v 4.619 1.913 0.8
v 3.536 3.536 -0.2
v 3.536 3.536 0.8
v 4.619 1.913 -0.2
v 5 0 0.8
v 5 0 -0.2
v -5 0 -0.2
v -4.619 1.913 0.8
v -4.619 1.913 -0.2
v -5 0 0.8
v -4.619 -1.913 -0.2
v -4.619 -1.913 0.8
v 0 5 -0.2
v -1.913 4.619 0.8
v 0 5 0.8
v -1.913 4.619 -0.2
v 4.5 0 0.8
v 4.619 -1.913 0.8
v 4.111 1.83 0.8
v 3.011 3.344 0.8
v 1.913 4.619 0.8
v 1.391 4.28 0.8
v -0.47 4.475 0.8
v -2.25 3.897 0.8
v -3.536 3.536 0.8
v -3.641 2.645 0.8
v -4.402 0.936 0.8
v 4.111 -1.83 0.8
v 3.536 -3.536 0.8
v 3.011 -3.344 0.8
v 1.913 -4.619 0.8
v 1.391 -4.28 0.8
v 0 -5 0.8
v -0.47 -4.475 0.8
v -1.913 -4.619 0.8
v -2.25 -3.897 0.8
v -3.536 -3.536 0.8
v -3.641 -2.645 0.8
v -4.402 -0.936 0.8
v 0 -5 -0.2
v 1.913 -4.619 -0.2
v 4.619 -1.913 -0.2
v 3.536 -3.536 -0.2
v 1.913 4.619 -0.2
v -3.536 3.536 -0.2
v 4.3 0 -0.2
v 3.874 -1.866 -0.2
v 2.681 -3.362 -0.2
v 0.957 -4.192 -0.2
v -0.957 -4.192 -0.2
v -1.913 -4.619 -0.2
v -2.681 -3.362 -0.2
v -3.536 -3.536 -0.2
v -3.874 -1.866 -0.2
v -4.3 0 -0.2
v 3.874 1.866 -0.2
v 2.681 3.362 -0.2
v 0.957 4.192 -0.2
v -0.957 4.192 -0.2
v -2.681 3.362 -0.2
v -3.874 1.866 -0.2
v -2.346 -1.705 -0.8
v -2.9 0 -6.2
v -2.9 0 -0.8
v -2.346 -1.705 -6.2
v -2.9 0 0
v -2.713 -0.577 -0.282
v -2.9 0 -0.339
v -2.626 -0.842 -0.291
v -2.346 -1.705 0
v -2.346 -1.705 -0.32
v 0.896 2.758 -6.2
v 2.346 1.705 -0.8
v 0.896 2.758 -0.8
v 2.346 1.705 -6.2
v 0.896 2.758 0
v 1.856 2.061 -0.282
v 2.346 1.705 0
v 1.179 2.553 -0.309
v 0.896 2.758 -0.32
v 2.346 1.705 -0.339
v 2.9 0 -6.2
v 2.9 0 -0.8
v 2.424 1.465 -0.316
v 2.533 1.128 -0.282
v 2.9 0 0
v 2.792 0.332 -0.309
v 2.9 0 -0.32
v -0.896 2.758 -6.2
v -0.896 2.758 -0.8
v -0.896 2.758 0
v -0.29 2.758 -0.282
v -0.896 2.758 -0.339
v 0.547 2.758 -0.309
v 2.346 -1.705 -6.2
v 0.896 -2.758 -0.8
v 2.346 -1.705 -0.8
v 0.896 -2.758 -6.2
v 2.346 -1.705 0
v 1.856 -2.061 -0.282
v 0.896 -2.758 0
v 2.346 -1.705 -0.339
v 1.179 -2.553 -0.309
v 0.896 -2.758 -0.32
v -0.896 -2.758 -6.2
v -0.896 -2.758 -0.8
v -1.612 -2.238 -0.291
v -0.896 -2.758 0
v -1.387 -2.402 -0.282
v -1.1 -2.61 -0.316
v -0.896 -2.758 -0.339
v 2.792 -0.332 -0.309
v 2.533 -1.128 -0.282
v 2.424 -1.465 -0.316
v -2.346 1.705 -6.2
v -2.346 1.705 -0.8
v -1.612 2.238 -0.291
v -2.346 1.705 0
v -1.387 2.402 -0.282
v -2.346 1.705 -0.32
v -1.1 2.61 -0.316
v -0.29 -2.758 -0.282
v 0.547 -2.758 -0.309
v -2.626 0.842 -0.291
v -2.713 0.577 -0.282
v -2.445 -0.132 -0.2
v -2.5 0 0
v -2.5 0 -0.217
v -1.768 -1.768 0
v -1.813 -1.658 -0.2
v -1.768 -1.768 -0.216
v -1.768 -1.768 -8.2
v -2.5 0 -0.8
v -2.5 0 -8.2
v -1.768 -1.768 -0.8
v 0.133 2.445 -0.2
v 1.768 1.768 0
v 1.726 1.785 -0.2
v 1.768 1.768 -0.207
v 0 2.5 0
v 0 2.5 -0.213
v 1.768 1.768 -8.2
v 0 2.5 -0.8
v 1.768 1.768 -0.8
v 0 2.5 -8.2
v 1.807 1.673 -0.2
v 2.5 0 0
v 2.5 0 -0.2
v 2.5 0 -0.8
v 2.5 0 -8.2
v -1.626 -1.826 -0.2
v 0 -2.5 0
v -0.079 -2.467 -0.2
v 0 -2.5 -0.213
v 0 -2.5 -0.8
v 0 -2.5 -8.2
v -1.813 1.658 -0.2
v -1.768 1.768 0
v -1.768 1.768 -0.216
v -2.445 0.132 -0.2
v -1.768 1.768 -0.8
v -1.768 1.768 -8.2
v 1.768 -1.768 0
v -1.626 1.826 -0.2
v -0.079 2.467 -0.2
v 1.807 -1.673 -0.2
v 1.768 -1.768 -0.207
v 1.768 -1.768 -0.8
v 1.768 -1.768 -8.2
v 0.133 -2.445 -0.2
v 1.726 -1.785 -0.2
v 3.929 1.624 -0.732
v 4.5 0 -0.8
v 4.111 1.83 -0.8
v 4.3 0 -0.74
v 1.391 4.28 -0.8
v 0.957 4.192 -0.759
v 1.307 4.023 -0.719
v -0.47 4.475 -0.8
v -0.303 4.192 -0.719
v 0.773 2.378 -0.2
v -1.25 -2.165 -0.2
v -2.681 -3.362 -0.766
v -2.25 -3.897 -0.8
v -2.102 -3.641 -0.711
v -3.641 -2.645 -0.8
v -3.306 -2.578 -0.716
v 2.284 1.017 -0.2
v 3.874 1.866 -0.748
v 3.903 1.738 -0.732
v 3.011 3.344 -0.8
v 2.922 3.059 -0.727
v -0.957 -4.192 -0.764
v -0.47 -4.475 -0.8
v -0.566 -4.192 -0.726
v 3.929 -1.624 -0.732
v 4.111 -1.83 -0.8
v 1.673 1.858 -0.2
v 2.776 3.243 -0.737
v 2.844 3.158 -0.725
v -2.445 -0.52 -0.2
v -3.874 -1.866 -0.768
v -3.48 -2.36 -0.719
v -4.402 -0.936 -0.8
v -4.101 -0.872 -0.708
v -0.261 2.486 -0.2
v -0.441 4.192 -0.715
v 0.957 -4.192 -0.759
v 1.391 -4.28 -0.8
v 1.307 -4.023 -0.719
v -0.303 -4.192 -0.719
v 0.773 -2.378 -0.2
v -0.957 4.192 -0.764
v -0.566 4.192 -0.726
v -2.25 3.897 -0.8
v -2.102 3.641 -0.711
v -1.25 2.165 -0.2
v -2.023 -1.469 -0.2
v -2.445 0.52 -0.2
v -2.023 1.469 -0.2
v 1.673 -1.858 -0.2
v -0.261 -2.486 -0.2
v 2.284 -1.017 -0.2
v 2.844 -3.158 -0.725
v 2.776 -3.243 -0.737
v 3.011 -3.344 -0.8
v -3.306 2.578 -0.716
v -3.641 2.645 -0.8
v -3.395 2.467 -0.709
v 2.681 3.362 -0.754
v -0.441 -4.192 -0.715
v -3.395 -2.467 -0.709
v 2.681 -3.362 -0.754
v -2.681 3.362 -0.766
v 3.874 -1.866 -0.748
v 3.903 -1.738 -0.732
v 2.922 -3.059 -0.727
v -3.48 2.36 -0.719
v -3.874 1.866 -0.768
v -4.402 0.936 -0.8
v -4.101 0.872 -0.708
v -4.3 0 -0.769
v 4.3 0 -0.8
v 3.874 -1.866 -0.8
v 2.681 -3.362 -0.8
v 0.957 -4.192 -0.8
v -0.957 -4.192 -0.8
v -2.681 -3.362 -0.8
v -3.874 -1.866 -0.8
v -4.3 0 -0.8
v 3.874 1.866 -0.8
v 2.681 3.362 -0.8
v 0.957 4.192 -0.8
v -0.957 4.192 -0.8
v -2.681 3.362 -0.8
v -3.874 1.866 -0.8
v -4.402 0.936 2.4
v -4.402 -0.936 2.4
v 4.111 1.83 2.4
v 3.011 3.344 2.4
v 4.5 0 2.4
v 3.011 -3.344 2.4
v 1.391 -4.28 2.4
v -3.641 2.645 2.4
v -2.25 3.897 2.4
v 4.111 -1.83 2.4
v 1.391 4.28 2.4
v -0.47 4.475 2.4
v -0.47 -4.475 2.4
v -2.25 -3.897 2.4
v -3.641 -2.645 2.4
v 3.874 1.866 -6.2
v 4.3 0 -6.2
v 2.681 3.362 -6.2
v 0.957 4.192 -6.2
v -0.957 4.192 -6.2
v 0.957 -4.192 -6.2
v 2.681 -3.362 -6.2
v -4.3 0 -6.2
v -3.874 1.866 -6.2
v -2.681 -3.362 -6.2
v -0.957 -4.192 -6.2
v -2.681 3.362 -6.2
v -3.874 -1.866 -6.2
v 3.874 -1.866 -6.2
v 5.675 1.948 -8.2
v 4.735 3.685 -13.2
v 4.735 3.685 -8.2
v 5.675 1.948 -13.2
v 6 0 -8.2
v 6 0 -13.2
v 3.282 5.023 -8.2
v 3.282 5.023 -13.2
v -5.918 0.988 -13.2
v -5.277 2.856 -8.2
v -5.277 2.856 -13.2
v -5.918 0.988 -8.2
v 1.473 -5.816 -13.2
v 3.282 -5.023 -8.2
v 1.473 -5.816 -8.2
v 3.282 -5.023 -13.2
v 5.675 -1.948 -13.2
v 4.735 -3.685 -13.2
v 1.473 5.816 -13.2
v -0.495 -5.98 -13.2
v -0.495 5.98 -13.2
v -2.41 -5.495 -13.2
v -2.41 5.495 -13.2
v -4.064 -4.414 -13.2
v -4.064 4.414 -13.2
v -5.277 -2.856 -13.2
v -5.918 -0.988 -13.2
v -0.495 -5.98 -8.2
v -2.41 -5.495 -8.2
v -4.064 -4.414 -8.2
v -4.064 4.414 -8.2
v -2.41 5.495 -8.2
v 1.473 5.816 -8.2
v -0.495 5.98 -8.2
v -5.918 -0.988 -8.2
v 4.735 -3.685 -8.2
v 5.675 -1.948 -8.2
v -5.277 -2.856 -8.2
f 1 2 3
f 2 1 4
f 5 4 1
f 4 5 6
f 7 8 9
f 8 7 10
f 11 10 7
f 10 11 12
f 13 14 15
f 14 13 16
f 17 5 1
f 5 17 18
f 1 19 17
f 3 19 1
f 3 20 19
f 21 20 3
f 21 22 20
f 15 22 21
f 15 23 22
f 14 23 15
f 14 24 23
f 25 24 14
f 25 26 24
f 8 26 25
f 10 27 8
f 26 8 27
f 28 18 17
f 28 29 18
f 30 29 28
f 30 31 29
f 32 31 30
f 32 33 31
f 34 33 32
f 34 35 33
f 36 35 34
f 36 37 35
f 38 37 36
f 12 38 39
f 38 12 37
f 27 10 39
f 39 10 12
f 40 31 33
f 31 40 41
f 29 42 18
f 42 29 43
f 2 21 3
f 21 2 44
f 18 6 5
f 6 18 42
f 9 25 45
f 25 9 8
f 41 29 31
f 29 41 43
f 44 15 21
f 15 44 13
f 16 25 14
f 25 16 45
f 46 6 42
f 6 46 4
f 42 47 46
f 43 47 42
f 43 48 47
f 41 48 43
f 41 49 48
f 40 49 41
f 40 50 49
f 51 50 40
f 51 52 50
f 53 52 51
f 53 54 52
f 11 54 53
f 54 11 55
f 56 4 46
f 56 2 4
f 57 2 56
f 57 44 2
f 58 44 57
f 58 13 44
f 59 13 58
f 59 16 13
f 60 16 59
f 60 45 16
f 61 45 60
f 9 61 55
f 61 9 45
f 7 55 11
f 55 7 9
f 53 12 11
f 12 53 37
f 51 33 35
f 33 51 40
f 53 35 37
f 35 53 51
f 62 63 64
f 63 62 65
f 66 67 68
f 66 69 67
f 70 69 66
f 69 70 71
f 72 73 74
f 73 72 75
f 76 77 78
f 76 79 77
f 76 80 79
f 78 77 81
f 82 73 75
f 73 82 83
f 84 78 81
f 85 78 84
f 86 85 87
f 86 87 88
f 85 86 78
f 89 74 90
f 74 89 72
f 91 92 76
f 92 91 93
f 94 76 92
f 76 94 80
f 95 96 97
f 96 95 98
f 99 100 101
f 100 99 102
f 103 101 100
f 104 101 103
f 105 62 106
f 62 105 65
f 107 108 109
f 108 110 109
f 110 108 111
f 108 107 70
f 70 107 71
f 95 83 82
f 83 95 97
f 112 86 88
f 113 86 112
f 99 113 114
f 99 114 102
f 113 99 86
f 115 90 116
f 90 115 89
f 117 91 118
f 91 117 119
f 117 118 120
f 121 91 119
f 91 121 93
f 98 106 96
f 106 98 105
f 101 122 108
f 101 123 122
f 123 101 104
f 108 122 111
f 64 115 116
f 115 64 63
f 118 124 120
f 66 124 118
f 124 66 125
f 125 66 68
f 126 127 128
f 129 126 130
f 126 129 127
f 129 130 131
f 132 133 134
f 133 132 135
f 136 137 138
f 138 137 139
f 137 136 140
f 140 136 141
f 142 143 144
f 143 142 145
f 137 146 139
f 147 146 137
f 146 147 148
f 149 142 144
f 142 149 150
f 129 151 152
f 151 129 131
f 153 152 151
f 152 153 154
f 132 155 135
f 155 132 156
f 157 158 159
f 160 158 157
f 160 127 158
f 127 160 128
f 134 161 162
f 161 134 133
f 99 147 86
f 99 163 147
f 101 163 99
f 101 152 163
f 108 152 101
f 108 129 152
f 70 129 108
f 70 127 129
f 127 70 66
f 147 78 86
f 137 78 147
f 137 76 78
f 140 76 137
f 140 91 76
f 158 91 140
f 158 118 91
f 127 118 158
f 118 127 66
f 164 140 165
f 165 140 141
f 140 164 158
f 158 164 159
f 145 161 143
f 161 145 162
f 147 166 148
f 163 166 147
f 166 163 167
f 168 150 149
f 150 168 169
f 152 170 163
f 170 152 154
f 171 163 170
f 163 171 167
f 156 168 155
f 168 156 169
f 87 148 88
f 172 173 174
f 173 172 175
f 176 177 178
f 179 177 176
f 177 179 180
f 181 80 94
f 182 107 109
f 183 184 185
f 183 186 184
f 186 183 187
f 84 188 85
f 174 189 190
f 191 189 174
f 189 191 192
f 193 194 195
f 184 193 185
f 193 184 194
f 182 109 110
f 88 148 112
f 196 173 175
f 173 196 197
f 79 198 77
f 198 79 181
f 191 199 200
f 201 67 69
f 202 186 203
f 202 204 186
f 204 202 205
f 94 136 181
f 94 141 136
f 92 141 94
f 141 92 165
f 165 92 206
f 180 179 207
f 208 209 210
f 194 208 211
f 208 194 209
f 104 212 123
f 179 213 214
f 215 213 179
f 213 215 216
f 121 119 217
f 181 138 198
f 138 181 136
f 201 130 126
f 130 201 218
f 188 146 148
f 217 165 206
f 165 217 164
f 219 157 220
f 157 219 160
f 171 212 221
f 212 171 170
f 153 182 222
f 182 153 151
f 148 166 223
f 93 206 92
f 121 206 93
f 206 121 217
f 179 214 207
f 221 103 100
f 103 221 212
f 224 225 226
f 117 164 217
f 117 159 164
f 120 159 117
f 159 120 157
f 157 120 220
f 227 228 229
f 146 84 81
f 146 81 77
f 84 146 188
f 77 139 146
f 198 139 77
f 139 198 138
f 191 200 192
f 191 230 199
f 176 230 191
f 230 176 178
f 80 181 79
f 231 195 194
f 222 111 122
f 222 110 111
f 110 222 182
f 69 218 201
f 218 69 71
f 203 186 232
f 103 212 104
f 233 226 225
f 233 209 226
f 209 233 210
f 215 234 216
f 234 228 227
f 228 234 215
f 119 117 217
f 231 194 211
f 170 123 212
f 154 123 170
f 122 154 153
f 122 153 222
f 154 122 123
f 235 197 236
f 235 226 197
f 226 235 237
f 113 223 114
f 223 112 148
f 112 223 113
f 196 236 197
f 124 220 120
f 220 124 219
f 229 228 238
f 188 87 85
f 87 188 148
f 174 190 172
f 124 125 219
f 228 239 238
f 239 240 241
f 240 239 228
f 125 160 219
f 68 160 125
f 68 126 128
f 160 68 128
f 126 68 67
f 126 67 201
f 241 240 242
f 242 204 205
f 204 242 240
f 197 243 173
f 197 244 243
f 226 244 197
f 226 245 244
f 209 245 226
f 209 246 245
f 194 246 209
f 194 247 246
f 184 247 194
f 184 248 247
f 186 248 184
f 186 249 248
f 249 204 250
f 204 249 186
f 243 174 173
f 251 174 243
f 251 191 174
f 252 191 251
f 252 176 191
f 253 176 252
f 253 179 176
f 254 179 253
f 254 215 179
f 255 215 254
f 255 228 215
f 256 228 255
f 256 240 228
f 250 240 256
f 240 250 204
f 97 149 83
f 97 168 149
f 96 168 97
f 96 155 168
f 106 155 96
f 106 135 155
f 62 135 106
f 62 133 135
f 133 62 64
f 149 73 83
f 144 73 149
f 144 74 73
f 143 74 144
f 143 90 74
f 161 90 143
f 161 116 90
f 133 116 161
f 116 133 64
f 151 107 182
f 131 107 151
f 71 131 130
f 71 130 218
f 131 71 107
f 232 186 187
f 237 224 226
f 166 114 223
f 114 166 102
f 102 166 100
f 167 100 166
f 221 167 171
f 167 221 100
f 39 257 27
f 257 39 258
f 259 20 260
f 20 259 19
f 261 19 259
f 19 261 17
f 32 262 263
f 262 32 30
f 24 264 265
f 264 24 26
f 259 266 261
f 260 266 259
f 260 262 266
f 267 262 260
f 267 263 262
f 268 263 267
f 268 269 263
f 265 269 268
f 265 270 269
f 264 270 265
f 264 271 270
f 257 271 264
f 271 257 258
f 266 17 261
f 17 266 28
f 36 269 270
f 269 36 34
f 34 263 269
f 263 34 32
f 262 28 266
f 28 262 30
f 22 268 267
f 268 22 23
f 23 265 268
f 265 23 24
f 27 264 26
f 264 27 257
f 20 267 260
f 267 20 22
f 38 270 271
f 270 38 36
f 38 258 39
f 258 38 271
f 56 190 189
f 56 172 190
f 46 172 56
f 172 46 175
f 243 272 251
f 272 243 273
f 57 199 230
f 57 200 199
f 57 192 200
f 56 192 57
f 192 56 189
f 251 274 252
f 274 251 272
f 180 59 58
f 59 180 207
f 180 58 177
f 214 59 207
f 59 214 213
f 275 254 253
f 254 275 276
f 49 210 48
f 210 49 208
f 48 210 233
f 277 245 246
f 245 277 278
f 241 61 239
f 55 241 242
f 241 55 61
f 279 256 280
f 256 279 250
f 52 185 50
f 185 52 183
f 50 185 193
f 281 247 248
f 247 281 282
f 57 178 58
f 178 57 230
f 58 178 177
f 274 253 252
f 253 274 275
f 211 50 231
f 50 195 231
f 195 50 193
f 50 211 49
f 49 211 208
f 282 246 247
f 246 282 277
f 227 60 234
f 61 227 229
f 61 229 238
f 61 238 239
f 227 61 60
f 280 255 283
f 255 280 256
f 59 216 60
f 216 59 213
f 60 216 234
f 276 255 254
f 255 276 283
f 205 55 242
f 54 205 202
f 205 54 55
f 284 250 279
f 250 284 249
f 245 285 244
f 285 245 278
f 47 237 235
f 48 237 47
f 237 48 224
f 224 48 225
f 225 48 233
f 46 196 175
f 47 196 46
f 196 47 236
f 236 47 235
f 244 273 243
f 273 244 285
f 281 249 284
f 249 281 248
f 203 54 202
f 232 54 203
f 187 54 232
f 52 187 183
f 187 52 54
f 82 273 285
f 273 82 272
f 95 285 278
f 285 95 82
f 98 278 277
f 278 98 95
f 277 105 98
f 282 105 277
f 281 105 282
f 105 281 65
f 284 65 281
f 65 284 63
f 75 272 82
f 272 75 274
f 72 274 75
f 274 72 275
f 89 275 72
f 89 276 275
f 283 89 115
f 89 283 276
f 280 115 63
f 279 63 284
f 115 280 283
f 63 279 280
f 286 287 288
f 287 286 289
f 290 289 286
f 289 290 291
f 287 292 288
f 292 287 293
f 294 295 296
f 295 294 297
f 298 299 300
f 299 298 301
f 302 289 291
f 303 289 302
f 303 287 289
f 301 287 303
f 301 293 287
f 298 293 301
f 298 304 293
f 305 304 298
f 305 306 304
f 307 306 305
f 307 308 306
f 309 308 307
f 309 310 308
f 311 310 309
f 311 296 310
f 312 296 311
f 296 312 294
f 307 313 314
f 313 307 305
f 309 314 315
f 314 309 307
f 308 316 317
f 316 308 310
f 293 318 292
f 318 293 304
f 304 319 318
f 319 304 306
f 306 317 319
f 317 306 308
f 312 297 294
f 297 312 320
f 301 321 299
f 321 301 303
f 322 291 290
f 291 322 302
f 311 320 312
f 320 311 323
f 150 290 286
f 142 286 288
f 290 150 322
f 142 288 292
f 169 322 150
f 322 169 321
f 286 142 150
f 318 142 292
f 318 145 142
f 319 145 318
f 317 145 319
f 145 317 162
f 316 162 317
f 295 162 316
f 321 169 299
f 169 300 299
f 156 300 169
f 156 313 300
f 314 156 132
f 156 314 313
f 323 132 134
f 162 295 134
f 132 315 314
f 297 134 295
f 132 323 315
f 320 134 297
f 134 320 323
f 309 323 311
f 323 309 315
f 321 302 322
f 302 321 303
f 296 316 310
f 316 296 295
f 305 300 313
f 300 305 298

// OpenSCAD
// Parameters
shaft_diameter_mm = 5; //[2.5:10:0.1]
length_mm = 10; //[5:20:0.1]
head_diameter_mm = 9; //[4.5:18:0.1]
head_height_mm = 2.4; //[1.2:4.8:0.1]
tip_length_mm = 1.2; //[0.6:2.4:0.1]
transition_height_mm = 0.6; //[0.3:1.2:0.1]
overlap_mm = 0.8; //[0.5:2:0.1]
washer_outer_diameter_mm = 10; //[6:20:0.1]
washer_thickness_mm = 1; //[0.5:2:0.1]
pcb_spacer_height_mm = 6; //[3:12:0.1]
pcb_spacer_wall_mm = 1.8; //[0.9:3.6:0.1]
buzzer_diameter_mm = 12; //[6:24:0.1]
buzzer_height_mm = 5; //[2.5:10:0.1]
buzzer_post_diameter_mm = 3; //[1.5:6:0.1]
buzzer_post_height_mm = 2; //[1:4:0.1]

// Screw and Washer - complete geometry
module screw_and_washer() {
  color("DimGray") {
    // Screw Shaft
    translate([0, 0, -length_mm/2])
      cylinder(h=length_mm, r=shaft_diameter_mm/2, center=true);
    // Shaft Tip
    translate([0, 0, -length_mm - tip_length_mm/2 + overlap_mm])
      cylinder(h=tip_length_mm, r1=shaft_diameter_mm/2, r2=0, center=true);
    // Head to Shaft Transition
    translate([0, 0, transition_height_mm/2 - overlap_mm])
      cylinder(h=transition_height_mm, r1=head_diameter_mm/2, r2=shaft_diameter_mm/2, center=true);
    // Screw Head
    translate([0, 0, head_height_mm/2])
      cylinder(h=head_height_mm, r=head_diameter_mm/2, center=true);
    // Washer
    difference() {
      translate([0, 0, -washer_thickness_mm/2 + overlap_mm])
        cylinder(h=washer_thickness_mm, r=washer_outer_diameter_mm/2, center=true);
      translate([0, 0, -washer_thickness_mm/2 + overlap_mm])
        cylinder(h=washer_thickness_mm + 2*overlap_mm, r=shaft_diameter_mm/2 + overlap_mm/2, center=true);
    }
  }
}

// PCB Spacer - complete geometry
module pcb_spacer() {
  color("Silver") {
    difference() {
      translate([0, 0, -washer_thickness_mm - pcb_spacer_height_mm/2 + overlap_mm])
        cylinder(h=pcb_spacer_height_mm, r=shaft_diameter_mm/2 + pcb_spacer_wall_mm, center=true);
      translate([0, 0, -washer_thickness_mm - pcb_spacer_height_mm/2 + overlap_mm])
        cylinder(h=pcb_spacer_height_mm + 2*overlap_mm, r=shaft_diameter_mm/2 + overlap_mm/2, center=true);
    }
  }
}

// Buzzer - complete geometry
module buzzer() {
  color("Black") {
    // Buzzer Body
    translate([0, 0, -washer_thickness_mm - pcb_spacer_height_mm - buzzer_post_height_mm - buzzer_height_mm/2 + overlap_mm])
      cylinder(h=buzzer_height_mm, r=buzzer_diameter_mm/2, center=true);
    // Buzzer Post
    translate([0, 0, -washer_thickness_mm - pcb_spacer_height_mm - buzzer_post_height_mm/2 + overlap_mm])
      cylinder(h=buzzer_post_height_mm, r=buzzer_post_diameter_mm/2, center=true);
  }
}

// Assembly
module assembly() {
  screw_and_washer();
  pcb_spacer();
  buzzer();
}

assembly();
